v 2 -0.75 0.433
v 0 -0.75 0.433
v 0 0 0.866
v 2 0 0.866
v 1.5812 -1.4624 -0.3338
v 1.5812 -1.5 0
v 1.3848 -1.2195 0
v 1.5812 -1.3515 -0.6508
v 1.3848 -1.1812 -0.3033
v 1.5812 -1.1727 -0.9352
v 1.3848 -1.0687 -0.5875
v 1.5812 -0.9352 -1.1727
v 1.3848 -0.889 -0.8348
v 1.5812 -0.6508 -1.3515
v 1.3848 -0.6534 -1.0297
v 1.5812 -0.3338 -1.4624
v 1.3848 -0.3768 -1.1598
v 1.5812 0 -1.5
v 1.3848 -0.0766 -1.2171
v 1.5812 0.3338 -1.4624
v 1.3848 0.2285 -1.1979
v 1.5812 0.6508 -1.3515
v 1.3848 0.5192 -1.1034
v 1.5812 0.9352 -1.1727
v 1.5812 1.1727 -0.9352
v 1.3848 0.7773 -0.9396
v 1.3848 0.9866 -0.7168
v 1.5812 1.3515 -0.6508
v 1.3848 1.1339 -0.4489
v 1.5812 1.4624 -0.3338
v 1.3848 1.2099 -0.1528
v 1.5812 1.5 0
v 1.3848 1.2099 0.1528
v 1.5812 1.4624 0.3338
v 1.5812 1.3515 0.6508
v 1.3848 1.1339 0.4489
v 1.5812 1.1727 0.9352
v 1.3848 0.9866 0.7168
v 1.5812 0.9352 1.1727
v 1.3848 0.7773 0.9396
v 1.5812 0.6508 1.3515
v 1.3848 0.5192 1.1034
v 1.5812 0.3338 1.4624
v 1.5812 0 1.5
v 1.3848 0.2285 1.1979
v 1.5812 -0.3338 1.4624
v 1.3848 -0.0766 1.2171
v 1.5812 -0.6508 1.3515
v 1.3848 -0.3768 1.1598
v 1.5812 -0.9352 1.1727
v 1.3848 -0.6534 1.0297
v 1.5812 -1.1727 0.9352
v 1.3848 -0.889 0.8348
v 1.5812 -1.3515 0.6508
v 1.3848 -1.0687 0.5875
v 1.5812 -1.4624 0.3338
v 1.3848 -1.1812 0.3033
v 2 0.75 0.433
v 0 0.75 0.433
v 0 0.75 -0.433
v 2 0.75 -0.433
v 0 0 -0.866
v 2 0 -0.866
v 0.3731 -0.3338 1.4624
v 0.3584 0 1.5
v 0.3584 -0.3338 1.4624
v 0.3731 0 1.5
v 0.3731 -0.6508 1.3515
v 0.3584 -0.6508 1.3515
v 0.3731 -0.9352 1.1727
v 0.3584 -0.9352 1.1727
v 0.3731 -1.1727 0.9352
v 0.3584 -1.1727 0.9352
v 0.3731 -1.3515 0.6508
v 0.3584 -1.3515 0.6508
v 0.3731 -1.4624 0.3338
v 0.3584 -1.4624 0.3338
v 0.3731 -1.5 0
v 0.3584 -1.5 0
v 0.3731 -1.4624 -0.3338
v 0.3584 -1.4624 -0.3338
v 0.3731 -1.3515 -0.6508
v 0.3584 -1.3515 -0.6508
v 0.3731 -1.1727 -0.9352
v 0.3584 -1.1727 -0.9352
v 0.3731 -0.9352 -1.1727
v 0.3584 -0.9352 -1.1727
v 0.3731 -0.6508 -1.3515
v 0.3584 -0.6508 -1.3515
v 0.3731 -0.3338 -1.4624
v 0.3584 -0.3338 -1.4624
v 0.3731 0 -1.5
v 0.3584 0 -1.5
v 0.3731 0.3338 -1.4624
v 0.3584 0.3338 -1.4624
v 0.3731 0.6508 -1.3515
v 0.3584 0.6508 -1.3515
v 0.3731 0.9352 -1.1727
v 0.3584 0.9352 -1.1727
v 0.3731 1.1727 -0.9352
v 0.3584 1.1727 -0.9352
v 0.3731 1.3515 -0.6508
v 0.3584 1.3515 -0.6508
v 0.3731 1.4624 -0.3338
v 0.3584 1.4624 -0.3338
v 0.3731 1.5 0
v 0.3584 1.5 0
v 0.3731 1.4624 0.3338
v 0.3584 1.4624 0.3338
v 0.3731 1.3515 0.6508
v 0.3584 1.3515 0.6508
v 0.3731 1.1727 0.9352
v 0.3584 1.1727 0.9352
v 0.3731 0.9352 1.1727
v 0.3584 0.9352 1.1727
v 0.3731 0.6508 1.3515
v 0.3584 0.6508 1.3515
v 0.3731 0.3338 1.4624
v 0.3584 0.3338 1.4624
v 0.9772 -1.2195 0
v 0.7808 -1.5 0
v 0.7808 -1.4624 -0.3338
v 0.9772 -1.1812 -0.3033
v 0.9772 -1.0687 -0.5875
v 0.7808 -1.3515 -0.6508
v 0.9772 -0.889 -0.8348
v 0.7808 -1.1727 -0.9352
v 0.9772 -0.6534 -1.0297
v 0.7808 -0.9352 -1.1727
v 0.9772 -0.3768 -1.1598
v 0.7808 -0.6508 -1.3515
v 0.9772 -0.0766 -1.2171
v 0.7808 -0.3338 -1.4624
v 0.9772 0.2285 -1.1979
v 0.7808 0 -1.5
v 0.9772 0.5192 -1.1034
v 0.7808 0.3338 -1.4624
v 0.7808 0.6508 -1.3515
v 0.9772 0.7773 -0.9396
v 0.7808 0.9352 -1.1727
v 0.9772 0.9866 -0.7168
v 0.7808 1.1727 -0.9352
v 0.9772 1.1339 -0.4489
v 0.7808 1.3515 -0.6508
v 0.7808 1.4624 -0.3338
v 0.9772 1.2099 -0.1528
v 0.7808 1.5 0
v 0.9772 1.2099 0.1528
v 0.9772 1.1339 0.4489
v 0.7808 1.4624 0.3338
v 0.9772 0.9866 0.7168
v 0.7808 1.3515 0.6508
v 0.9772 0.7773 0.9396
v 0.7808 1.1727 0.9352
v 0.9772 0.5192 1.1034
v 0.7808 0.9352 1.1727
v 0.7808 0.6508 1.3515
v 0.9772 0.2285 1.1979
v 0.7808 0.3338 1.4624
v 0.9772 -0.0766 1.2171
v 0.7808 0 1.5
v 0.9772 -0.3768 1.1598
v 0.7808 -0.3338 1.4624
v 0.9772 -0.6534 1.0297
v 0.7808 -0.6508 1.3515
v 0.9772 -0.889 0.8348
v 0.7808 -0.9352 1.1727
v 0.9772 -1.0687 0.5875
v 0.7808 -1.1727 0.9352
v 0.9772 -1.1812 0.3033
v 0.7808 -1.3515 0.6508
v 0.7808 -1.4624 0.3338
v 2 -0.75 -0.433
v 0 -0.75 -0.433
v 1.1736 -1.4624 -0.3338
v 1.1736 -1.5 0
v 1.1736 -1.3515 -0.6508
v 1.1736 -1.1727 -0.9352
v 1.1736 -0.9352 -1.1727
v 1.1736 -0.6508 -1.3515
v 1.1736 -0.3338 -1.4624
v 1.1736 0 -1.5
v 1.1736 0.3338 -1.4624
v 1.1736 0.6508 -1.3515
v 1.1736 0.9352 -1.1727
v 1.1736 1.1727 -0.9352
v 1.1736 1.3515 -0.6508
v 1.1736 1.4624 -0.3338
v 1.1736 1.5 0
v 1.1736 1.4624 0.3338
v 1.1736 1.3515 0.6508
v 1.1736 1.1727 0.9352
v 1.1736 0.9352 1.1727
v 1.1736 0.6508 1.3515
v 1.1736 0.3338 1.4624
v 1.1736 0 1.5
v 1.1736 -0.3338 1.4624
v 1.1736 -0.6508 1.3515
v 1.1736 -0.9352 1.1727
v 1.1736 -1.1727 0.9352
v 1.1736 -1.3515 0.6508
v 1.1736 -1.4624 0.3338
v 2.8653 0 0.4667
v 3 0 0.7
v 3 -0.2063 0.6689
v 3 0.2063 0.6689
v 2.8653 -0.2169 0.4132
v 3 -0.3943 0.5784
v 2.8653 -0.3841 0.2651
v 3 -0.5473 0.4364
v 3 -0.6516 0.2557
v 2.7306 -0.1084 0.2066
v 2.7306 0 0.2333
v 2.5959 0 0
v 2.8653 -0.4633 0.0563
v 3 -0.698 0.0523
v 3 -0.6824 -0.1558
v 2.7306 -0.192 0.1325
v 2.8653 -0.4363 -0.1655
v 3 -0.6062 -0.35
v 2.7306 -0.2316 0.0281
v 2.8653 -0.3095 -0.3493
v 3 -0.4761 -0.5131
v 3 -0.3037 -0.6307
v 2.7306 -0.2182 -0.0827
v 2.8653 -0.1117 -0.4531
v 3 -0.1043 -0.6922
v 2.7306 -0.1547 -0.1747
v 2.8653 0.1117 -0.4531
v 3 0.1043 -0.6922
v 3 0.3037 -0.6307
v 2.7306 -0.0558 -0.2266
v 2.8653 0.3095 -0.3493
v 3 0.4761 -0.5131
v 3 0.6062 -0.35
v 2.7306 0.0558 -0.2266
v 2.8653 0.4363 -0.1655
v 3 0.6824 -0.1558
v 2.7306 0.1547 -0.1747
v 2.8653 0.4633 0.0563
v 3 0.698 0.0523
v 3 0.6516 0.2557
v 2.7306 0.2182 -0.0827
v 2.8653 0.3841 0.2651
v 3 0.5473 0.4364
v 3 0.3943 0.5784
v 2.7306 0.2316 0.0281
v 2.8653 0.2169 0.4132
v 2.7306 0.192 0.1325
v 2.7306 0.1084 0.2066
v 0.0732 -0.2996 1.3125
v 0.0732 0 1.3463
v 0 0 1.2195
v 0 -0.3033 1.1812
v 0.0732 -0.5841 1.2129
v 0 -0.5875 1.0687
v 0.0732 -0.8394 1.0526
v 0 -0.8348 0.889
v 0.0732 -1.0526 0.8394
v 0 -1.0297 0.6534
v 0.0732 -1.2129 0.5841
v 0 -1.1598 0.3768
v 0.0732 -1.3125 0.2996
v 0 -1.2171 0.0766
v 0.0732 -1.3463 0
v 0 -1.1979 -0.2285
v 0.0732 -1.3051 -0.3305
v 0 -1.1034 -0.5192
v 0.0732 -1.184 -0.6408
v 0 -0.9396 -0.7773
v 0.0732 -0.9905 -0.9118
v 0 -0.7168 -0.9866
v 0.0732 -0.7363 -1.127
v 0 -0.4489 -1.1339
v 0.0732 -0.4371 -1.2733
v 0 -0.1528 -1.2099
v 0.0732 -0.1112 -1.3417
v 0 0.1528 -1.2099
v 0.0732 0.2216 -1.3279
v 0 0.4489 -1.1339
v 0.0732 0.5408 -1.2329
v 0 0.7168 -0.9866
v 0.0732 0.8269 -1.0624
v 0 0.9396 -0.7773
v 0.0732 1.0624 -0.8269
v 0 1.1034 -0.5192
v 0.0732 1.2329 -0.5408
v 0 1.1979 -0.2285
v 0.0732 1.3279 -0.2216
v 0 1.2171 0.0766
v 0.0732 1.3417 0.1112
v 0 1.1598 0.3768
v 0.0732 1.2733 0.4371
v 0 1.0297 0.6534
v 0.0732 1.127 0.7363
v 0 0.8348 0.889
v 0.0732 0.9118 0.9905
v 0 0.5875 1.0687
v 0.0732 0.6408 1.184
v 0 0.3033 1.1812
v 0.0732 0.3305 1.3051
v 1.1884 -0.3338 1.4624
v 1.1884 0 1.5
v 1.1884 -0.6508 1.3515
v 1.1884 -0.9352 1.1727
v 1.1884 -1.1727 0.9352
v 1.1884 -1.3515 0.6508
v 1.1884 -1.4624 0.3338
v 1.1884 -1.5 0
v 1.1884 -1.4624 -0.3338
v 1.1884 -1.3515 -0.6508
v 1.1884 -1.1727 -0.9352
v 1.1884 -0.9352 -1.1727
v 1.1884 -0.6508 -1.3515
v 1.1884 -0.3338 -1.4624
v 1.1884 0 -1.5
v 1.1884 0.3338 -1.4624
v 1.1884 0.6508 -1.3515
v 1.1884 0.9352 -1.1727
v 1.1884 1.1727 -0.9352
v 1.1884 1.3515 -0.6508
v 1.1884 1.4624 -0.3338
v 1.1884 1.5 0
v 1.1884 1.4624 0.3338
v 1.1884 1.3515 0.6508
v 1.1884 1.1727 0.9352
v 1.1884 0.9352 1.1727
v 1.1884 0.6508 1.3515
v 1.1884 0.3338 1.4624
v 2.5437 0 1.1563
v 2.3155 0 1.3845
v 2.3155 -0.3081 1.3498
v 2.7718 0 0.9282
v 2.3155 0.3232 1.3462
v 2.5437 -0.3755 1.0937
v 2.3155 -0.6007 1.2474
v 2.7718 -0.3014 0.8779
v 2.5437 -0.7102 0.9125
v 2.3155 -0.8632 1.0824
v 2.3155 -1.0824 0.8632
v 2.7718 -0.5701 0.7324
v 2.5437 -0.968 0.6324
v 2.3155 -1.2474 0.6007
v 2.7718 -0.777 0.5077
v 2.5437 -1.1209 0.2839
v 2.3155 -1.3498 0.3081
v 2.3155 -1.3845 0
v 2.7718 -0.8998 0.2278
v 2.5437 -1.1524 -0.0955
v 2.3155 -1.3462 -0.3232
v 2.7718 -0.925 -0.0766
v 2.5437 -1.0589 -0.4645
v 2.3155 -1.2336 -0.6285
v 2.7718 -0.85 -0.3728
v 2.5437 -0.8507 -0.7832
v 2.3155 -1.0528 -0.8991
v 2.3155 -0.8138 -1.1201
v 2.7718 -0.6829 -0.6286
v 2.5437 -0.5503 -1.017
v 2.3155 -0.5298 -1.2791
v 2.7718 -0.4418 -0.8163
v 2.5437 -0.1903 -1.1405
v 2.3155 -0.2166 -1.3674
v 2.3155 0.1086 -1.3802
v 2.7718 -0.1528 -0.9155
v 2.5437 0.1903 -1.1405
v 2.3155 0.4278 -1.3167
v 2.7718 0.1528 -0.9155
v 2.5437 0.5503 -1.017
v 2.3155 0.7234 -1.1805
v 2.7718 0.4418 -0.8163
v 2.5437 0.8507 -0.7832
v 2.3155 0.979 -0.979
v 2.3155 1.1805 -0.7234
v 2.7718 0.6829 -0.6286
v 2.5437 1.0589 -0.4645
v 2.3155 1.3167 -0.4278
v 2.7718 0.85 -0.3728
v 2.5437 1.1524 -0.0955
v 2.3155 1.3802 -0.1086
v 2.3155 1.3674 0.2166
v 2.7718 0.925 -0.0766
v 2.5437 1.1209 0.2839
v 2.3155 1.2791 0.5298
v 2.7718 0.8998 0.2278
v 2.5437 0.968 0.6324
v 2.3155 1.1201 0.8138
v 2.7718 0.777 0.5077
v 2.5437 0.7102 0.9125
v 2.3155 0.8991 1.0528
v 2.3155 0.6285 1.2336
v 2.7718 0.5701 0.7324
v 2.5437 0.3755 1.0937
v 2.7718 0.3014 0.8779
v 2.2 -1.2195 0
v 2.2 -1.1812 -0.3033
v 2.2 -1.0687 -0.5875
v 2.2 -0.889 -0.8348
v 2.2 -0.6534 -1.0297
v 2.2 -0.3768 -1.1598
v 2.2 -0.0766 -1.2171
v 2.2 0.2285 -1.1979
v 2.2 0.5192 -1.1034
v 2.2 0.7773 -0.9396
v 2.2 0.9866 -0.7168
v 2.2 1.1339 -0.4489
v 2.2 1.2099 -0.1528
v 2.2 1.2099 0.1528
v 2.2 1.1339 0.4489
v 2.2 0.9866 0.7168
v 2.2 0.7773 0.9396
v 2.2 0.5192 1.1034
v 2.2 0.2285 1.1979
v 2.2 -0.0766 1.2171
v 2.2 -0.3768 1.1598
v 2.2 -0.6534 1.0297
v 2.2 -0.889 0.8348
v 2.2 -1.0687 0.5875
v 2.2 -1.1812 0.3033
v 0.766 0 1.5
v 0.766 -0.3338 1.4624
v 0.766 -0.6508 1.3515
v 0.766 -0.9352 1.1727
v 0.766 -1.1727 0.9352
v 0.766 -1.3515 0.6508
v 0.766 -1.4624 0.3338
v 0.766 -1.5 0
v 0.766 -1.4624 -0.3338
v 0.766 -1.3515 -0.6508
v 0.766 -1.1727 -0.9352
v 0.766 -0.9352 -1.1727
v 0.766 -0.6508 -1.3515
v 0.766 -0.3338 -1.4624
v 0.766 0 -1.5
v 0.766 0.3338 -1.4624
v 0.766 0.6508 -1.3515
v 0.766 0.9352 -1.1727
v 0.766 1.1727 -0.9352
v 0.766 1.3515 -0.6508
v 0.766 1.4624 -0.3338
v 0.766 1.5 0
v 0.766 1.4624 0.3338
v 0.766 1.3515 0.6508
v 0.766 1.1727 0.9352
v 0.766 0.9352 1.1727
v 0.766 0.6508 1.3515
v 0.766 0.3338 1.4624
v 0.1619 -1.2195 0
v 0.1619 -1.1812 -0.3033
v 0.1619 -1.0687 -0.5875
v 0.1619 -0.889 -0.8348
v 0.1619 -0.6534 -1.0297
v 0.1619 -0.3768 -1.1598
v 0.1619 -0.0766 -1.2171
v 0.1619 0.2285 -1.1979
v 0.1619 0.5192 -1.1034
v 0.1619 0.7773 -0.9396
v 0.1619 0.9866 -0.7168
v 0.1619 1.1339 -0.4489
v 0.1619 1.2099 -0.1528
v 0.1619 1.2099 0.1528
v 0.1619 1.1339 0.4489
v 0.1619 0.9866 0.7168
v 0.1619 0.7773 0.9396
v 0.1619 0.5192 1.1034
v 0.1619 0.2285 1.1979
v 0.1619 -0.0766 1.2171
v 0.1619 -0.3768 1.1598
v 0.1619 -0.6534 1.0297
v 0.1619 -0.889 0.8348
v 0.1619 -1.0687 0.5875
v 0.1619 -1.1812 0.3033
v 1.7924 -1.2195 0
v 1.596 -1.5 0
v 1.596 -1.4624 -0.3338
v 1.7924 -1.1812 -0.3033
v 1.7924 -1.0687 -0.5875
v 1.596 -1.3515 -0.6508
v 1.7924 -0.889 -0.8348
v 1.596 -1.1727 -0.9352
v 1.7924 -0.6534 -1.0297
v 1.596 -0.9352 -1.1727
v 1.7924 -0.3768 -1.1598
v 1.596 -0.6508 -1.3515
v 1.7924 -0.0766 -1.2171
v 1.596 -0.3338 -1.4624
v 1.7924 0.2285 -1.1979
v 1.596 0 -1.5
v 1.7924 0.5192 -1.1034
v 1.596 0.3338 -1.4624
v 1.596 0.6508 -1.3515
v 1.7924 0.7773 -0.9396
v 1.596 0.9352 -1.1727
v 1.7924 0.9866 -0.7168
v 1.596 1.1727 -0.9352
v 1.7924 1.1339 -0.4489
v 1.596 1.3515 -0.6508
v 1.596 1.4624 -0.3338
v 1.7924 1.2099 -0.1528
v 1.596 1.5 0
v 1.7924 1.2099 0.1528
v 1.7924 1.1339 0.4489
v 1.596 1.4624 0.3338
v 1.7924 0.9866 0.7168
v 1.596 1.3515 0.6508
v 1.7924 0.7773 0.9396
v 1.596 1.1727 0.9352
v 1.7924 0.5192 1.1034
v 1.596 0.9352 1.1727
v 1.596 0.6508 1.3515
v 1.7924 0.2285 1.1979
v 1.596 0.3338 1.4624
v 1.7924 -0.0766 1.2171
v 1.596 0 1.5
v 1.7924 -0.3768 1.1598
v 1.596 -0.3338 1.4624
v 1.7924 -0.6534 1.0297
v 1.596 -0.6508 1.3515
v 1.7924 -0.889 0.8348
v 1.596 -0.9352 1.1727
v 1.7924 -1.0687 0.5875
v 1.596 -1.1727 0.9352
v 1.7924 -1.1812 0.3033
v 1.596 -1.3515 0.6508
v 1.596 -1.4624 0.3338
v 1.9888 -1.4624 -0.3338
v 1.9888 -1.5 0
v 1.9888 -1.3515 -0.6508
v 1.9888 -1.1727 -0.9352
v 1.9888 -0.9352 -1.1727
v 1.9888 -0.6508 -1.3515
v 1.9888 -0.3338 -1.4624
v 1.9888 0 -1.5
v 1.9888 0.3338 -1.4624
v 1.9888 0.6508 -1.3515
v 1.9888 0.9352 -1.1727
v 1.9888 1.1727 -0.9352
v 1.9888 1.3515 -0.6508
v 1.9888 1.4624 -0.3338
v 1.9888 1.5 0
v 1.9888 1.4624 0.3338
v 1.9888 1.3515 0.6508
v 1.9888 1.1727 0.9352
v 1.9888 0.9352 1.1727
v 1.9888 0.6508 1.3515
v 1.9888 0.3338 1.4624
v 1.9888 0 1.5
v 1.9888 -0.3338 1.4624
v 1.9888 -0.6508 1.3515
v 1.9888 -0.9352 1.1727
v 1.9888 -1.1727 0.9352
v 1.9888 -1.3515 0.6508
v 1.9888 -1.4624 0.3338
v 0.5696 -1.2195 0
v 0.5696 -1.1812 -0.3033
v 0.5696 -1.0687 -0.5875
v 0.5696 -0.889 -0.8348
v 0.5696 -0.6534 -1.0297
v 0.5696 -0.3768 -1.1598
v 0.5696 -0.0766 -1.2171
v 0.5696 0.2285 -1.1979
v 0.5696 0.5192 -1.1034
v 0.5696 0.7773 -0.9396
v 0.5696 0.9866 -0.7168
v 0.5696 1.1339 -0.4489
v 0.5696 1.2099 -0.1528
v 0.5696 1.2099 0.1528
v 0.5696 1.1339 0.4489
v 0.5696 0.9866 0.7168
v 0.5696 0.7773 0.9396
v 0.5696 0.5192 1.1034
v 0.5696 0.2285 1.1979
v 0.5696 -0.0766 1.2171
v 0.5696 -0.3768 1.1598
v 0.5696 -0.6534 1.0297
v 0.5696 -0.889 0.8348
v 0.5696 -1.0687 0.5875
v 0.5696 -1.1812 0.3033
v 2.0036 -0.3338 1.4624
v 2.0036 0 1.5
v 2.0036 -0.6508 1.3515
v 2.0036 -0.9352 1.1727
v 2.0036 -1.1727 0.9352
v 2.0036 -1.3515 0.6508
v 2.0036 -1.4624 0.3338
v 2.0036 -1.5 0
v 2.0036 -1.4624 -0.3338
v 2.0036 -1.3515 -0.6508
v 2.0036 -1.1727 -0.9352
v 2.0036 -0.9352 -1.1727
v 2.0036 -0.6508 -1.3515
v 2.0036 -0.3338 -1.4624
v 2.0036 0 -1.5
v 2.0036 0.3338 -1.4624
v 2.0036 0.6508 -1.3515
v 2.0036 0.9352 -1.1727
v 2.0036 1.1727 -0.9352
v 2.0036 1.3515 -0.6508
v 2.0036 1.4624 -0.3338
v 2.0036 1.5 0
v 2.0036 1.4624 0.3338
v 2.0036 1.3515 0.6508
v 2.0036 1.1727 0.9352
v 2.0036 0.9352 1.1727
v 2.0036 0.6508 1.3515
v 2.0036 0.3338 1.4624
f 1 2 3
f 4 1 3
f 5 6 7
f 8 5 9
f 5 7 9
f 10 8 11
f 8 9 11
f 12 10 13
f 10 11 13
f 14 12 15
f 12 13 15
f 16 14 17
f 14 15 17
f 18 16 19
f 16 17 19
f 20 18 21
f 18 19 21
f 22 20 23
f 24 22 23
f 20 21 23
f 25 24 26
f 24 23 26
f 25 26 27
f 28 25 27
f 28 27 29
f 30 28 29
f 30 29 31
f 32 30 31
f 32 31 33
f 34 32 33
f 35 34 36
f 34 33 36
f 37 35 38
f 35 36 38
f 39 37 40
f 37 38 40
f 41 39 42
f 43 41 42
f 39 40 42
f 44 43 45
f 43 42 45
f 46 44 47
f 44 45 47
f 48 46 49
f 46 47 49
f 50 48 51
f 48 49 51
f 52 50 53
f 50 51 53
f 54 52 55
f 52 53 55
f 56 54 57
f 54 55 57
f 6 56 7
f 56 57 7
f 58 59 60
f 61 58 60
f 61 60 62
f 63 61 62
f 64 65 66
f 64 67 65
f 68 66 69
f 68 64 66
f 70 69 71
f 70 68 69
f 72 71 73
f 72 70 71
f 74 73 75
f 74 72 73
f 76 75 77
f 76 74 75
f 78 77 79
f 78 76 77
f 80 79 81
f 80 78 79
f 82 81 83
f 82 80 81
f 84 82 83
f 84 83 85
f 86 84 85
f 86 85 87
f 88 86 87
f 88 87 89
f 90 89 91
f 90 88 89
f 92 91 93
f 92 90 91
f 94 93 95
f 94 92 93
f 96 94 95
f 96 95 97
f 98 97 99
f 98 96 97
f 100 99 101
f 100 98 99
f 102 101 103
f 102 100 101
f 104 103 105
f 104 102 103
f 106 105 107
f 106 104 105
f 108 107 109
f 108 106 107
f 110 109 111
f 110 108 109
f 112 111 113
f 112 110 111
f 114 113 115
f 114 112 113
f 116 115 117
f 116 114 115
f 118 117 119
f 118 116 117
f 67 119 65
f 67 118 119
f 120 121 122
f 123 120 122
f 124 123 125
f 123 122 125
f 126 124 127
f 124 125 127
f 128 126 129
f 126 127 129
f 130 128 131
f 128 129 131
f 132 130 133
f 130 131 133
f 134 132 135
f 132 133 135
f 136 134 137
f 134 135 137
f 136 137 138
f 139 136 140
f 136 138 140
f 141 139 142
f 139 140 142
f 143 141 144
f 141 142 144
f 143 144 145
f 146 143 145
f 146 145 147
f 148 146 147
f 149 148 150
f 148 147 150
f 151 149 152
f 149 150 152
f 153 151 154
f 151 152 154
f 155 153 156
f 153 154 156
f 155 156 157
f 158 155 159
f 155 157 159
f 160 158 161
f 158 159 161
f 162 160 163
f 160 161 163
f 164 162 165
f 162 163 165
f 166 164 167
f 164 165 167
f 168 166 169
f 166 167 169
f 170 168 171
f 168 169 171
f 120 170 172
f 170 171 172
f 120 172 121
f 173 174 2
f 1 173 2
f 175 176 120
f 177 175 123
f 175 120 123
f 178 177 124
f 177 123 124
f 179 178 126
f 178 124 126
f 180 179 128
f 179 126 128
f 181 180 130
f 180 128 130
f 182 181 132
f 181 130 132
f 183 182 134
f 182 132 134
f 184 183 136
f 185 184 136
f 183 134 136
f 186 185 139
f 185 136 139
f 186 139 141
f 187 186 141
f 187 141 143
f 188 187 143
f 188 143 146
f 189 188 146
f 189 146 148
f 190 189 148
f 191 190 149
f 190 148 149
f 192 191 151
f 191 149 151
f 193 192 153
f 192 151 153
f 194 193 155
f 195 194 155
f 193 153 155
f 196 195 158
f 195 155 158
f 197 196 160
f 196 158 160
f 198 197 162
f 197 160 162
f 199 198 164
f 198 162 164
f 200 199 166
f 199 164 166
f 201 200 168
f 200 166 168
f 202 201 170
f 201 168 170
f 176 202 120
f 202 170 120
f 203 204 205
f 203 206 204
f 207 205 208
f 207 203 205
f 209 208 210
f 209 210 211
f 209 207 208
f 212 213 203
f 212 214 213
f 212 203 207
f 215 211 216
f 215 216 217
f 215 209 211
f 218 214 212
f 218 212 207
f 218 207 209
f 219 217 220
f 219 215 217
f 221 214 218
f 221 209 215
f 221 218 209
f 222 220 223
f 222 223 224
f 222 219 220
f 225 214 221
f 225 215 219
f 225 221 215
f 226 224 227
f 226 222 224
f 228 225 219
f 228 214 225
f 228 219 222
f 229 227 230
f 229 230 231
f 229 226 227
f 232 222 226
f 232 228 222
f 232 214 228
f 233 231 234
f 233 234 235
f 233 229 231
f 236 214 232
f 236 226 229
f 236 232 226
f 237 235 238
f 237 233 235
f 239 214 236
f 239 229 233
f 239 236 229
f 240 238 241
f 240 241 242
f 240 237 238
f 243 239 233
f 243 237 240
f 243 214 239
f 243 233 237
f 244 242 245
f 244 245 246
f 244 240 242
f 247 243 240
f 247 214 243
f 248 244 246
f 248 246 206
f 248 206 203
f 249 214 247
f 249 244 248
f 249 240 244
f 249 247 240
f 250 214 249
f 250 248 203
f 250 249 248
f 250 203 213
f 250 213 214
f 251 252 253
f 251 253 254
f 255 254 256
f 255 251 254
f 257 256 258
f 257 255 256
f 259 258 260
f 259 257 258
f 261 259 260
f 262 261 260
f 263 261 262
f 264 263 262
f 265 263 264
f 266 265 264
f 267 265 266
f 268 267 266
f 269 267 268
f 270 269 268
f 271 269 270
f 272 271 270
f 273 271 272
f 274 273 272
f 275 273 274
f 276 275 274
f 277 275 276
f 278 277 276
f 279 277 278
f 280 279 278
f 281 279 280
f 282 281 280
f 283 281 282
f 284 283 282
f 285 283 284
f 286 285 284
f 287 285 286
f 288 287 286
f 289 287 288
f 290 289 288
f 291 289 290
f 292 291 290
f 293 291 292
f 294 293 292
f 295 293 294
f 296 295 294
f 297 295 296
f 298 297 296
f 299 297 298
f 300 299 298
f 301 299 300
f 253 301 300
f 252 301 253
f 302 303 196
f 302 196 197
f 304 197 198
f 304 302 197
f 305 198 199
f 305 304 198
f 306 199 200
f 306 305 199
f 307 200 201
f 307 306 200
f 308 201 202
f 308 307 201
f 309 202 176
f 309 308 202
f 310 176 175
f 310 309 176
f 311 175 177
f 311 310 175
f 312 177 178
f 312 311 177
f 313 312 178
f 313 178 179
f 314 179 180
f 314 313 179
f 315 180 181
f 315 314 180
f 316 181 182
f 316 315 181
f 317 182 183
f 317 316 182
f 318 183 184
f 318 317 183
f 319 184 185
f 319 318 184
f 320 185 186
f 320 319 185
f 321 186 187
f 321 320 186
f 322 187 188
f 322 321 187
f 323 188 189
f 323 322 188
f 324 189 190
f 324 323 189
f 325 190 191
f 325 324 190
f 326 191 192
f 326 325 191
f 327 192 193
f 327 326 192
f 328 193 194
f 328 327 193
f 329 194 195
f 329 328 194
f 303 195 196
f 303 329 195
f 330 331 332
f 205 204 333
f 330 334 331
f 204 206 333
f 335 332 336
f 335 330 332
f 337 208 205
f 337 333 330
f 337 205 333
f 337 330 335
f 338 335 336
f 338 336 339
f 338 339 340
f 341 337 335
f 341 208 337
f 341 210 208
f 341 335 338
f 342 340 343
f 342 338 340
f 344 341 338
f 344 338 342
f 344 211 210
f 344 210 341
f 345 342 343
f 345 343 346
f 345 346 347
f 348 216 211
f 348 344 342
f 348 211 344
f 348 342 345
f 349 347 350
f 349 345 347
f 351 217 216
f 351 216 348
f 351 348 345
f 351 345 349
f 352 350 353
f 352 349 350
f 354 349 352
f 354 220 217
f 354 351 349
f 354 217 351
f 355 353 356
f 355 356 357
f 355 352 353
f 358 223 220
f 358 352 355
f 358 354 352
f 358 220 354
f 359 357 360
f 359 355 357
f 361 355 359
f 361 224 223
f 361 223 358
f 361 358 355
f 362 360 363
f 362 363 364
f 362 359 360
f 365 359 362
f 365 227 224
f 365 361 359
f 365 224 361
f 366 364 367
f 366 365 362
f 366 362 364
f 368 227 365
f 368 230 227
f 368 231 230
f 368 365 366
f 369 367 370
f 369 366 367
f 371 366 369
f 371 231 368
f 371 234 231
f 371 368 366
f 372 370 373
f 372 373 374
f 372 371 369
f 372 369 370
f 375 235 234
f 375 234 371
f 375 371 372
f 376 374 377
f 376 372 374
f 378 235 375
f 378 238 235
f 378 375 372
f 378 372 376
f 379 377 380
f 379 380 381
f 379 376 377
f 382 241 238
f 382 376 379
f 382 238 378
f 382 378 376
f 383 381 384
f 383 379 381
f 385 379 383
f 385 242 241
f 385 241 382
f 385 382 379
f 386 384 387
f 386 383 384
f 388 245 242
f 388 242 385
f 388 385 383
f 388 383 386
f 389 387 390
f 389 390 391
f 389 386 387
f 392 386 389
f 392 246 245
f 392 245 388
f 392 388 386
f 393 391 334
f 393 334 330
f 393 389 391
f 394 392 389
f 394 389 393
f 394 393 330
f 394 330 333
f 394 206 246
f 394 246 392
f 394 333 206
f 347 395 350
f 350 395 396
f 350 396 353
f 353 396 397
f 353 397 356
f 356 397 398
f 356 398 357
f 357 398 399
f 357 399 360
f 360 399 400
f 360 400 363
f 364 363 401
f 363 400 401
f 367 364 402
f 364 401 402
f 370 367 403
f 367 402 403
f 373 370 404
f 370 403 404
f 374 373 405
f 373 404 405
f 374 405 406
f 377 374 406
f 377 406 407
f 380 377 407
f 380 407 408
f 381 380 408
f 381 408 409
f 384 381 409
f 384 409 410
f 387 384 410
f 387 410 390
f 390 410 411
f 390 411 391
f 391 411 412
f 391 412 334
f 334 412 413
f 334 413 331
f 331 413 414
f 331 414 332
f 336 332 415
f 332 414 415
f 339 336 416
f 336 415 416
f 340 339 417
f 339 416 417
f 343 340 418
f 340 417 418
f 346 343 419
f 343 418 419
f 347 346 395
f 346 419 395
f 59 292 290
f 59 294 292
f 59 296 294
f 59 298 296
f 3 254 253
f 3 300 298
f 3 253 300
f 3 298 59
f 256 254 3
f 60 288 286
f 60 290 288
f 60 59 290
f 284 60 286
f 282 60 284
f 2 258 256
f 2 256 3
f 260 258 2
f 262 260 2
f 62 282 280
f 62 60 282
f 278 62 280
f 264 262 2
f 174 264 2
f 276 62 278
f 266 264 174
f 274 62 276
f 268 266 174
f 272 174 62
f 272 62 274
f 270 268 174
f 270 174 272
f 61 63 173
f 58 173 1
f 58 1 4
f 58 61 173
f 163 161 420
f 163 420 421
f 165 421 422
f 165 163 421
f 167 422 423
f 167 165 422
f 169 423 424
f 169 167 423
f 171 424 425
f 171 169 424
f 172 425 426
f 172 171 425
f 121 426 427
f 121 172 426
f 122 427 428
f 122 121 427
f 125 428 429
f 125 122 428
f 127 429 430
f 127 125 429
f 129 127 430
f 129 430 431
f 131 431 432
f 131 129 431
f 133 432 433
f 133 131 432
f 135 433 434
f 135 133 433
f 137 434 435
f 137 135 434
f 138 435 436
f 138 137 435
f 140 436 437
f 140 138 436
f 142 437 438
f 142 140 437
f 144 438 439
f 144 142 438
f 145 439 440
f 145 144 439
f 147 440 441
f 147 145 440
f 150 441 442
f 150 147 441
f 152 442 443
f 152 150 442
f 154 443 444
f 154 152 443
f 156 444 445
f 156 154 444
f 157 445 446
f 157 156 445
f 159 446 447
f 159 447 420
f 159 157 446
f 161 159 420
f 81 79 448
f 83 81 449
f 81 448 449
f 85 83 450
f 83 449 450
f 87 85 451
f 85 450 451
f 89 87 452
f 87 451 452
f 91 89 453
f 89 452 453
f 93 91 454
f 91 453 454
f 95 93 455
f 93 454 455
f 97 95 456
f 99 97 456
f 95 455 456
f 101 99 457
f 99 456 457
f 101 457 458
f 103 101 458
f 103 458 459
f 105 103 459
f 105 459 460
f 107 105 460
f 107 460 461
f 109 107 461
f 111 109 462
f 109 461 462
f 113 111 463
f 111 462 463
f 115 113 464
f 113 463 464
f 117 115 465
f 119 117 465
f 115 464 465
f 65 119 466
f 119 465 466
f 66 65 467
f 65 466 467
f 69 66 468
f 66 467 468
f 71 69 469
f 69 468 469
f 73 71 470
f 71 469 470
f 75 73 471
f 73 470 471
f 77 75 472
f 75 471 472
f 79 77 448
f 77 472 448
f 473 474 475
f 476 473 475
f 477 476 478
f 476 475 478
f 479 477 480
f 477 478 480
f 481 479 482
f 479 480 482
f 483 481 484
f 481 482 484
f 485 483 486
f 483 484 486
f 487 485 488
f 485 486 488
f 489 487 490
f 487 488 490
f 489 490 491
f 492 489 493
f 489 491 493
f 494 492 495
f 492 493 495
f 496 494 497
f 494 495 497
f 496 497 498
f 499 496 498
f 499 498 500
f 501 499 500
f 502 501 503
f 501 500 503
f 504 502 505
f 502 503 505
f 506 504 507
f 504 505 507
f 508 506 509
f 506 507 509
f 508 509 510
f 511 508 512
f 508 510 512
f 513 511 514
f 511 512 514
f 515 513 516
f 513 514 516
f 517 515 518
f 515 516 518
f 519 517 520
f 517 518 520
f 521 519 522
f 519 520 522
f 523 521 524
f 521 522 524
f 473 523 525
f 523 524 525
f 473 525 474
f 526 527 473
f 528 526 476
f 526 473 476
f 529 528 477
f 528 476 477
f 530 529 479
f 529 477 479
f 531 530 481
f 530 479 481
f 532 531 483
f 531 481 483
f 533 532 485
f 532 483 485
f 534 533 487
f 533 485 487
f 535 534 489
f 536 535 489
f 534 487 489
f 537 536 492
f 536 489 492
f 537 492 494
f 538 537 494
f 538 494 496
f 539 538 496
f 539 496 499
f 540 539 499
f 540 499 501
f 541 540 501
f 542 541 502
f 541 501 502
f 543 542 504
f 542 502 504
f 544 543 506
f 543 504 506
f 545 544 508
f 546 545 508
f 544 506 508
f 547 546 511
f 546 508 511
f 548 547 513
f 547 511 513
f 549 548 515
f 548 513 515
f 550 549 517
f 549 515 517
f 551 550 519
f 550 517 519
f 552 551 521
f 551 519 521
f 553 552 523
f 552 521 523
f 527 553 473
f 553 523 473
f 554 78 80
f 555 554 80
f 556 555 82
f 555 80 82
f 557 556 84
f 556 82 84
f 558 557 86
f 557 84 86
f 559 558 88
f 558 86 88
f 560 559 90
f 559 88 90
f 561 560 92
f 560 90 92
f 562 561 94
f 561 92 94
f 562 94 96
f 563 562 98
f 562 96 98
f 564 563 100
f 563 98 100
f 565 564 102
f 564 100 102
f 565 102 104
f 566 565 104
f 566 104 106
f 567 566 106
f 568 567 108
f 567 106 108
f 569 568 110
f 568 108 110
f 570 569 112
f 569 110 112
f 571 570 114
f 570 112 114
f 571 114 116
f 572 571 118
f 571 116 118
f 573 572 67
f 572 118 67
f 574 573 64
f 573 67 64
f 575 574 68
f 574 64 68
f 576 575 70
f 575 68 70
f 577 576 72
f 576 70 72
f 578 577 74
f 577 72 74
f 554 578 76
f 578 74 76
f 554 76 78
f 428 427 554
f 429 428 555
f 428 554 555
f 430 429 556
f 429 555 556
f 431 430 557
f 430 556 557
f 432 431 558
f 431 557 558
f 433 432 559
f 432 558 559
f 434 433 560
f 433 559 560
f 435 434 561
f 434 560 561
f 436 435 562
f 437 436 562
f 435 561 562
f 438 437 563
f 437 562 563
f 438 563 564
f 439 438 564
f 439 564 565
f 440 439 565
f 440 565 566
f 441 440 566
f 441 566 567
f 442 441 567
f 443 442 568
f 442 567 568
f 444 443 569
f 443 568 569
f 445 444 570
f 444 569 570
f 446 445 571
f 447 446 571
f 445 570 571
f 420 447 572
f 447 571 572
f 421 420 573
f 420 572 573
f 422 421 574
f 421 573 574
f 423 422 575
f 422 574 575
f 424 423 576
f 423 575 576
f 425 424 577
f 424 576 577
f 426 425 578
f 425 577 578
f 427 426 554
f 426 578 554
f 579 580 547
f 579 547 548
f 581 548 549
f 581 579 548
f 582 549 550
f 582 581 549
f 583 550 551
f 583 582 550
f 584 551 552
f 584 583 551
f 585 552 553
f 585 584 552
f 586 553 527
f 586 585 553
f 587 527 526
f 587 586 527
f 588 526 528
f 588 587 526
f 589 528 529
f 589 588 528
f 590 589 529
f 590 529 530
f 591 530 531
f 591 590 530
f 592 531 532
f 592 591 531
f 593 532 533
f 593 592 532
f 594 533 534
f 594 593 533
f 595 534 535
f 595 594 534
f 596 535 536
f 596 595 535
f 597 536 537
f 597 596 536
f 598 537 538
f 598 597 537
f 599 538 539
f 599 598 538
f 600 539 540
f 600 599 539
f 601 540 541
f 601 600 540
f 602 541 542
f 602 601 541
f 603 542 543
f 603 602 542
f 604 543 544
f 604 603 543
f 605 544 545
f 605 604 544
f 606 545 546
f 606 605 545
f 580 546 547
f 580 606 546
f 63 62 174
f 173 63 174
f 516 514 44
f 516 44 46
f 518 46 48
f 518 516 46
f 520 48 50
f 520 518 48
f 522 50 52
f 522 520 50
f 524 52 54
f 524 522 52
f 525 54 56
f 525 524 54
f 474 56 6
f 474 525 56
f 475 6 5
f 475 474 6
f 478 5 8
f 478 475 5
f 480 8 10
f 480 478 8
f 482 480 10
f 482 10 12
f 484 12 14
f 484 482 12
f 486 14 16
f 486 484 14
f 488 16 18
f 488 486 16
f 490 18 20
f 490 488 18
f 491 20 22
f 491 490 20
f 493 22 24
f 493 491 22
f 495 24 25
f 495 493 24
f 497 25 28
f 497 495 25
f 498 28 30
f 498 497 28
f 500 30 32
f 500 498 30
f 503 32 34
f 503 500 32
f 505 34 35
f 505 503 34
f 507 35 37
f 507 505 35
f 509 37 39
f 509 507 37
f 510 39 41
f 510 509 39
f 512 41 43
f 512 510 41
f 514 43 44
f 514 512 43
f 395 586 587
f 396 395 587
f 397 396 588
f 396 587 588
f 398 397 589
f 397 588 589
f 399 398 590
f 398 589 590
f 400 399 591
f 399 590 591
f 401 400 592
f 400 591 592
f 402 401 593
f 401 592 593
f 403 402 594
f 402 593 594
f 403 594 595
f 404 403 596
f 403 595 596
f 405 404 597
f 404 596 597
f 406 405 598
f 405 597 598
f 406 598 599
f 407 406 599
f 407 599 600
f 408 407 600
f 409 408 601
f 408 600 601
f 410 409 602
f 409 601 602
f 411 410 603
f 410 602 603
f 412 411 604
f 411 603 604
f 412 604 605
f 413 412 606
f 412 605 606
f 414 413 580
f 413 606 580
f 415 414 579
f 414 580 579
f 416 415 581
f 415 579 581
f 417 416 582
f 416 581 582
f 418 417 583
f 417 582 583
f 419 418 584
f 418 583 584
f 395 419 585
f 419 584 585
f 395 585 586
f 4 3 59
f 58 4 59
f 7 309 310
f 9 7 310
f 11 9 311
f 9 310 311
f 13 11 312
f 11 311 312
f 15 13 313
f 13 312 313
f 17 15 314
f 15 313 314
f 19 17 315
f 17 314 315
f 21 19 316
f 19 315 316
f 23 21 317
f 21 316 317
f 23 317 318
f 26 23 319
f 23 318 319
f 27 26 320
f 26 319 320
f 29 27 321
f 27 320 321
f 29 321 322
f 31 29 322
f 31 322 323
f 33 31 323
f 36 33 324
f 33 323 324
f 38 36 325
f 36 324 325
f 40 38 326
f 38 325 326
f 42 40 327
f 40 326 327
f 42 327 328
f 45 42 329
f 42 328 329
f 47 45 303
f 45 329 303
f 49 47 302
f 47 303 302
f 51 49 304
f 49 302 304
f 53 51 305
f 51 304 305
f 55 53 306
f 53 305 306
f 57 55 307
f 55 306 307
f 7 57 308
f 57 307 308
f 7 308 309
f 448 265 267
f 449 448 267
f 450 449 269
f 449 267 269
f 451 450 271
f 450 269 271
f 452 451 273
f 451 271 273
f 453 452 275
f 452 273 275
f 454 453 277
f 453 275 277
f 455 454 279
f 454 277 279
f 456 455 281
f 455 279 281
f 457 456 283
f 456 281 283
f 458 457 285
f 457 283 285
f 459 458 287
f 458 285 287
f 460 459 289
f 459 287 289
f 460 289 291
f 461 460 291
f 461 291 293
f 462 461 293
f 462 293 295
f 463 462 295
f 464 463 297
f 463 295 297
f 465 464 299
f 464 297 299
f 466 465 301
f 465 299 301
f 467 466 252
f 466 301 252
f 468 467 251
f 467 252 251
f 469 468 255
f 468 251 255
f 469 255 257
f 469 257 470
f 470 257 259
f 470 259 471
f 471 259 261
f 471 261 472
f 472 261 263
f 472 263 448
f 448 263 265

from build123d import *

# Parameters (mm, degrees)
HEX_2_DEPTH     = 2
THDSCHPAT_COUNT = 6
THDSCHPAT_PITCH = 0.407610675


with BuildPart() as part:
    # BodySke → BaseBody (revolve)
    with BuildSketch(Plane.XY, mode=Mode.PRIVATE) as basebody_sk:
        Polygon((0, 0), (0, 1.2195), (0.161946751, 1.5), (2.2, 1.5), (3, 0.7), (2.595854812, 0), align=None)
    revolve(basebody_sk.sketch.rotate(Axis((-12.7, 0, 0), (1, 0, 0)), 90), axis=Axis((-12.7, 0, 0), (1, 0, 0)))

    # Sketch2 → Hex 2 (cut)
    with BuildSketch(Plane.ZY):
        Polygon((0.433012702, 0.75), (-0.433012702, 0.75), (-0.866025404, 0), (-0.433012702, -0.75), (0.433012702, -0.75), (0.866025404, 0), align=None)
    extrude(amount=-HEX_2_DEPTH, mode=Mode.SUBTRACT)

    # ThdSchSke → ThreadSchematic (revolve, cut)
    with BuildSketch(Plane.XY):
        Polygon((0.161946751, -1.2195), (-0.034461464, -1.5), (-0.034461464, -1.875), (0.358354965, -1.875), (0.358354965, -1.5), align=None)
    threadschematic = revolve(axis=Axis((-3.175, 0, 0), (1, 0, 0)), mode=Mode.SUBTRACT)

    # ThdSchPat: ThreadSchematic ×6
    with Locations(*[(i * THDSCHPAT_PITCH, 0, 0) for i in range(1, THDSCHPAT_COUNT)]):
        add(threadschematic, mode=Mode.SUBTRACT)


solid = part.part
